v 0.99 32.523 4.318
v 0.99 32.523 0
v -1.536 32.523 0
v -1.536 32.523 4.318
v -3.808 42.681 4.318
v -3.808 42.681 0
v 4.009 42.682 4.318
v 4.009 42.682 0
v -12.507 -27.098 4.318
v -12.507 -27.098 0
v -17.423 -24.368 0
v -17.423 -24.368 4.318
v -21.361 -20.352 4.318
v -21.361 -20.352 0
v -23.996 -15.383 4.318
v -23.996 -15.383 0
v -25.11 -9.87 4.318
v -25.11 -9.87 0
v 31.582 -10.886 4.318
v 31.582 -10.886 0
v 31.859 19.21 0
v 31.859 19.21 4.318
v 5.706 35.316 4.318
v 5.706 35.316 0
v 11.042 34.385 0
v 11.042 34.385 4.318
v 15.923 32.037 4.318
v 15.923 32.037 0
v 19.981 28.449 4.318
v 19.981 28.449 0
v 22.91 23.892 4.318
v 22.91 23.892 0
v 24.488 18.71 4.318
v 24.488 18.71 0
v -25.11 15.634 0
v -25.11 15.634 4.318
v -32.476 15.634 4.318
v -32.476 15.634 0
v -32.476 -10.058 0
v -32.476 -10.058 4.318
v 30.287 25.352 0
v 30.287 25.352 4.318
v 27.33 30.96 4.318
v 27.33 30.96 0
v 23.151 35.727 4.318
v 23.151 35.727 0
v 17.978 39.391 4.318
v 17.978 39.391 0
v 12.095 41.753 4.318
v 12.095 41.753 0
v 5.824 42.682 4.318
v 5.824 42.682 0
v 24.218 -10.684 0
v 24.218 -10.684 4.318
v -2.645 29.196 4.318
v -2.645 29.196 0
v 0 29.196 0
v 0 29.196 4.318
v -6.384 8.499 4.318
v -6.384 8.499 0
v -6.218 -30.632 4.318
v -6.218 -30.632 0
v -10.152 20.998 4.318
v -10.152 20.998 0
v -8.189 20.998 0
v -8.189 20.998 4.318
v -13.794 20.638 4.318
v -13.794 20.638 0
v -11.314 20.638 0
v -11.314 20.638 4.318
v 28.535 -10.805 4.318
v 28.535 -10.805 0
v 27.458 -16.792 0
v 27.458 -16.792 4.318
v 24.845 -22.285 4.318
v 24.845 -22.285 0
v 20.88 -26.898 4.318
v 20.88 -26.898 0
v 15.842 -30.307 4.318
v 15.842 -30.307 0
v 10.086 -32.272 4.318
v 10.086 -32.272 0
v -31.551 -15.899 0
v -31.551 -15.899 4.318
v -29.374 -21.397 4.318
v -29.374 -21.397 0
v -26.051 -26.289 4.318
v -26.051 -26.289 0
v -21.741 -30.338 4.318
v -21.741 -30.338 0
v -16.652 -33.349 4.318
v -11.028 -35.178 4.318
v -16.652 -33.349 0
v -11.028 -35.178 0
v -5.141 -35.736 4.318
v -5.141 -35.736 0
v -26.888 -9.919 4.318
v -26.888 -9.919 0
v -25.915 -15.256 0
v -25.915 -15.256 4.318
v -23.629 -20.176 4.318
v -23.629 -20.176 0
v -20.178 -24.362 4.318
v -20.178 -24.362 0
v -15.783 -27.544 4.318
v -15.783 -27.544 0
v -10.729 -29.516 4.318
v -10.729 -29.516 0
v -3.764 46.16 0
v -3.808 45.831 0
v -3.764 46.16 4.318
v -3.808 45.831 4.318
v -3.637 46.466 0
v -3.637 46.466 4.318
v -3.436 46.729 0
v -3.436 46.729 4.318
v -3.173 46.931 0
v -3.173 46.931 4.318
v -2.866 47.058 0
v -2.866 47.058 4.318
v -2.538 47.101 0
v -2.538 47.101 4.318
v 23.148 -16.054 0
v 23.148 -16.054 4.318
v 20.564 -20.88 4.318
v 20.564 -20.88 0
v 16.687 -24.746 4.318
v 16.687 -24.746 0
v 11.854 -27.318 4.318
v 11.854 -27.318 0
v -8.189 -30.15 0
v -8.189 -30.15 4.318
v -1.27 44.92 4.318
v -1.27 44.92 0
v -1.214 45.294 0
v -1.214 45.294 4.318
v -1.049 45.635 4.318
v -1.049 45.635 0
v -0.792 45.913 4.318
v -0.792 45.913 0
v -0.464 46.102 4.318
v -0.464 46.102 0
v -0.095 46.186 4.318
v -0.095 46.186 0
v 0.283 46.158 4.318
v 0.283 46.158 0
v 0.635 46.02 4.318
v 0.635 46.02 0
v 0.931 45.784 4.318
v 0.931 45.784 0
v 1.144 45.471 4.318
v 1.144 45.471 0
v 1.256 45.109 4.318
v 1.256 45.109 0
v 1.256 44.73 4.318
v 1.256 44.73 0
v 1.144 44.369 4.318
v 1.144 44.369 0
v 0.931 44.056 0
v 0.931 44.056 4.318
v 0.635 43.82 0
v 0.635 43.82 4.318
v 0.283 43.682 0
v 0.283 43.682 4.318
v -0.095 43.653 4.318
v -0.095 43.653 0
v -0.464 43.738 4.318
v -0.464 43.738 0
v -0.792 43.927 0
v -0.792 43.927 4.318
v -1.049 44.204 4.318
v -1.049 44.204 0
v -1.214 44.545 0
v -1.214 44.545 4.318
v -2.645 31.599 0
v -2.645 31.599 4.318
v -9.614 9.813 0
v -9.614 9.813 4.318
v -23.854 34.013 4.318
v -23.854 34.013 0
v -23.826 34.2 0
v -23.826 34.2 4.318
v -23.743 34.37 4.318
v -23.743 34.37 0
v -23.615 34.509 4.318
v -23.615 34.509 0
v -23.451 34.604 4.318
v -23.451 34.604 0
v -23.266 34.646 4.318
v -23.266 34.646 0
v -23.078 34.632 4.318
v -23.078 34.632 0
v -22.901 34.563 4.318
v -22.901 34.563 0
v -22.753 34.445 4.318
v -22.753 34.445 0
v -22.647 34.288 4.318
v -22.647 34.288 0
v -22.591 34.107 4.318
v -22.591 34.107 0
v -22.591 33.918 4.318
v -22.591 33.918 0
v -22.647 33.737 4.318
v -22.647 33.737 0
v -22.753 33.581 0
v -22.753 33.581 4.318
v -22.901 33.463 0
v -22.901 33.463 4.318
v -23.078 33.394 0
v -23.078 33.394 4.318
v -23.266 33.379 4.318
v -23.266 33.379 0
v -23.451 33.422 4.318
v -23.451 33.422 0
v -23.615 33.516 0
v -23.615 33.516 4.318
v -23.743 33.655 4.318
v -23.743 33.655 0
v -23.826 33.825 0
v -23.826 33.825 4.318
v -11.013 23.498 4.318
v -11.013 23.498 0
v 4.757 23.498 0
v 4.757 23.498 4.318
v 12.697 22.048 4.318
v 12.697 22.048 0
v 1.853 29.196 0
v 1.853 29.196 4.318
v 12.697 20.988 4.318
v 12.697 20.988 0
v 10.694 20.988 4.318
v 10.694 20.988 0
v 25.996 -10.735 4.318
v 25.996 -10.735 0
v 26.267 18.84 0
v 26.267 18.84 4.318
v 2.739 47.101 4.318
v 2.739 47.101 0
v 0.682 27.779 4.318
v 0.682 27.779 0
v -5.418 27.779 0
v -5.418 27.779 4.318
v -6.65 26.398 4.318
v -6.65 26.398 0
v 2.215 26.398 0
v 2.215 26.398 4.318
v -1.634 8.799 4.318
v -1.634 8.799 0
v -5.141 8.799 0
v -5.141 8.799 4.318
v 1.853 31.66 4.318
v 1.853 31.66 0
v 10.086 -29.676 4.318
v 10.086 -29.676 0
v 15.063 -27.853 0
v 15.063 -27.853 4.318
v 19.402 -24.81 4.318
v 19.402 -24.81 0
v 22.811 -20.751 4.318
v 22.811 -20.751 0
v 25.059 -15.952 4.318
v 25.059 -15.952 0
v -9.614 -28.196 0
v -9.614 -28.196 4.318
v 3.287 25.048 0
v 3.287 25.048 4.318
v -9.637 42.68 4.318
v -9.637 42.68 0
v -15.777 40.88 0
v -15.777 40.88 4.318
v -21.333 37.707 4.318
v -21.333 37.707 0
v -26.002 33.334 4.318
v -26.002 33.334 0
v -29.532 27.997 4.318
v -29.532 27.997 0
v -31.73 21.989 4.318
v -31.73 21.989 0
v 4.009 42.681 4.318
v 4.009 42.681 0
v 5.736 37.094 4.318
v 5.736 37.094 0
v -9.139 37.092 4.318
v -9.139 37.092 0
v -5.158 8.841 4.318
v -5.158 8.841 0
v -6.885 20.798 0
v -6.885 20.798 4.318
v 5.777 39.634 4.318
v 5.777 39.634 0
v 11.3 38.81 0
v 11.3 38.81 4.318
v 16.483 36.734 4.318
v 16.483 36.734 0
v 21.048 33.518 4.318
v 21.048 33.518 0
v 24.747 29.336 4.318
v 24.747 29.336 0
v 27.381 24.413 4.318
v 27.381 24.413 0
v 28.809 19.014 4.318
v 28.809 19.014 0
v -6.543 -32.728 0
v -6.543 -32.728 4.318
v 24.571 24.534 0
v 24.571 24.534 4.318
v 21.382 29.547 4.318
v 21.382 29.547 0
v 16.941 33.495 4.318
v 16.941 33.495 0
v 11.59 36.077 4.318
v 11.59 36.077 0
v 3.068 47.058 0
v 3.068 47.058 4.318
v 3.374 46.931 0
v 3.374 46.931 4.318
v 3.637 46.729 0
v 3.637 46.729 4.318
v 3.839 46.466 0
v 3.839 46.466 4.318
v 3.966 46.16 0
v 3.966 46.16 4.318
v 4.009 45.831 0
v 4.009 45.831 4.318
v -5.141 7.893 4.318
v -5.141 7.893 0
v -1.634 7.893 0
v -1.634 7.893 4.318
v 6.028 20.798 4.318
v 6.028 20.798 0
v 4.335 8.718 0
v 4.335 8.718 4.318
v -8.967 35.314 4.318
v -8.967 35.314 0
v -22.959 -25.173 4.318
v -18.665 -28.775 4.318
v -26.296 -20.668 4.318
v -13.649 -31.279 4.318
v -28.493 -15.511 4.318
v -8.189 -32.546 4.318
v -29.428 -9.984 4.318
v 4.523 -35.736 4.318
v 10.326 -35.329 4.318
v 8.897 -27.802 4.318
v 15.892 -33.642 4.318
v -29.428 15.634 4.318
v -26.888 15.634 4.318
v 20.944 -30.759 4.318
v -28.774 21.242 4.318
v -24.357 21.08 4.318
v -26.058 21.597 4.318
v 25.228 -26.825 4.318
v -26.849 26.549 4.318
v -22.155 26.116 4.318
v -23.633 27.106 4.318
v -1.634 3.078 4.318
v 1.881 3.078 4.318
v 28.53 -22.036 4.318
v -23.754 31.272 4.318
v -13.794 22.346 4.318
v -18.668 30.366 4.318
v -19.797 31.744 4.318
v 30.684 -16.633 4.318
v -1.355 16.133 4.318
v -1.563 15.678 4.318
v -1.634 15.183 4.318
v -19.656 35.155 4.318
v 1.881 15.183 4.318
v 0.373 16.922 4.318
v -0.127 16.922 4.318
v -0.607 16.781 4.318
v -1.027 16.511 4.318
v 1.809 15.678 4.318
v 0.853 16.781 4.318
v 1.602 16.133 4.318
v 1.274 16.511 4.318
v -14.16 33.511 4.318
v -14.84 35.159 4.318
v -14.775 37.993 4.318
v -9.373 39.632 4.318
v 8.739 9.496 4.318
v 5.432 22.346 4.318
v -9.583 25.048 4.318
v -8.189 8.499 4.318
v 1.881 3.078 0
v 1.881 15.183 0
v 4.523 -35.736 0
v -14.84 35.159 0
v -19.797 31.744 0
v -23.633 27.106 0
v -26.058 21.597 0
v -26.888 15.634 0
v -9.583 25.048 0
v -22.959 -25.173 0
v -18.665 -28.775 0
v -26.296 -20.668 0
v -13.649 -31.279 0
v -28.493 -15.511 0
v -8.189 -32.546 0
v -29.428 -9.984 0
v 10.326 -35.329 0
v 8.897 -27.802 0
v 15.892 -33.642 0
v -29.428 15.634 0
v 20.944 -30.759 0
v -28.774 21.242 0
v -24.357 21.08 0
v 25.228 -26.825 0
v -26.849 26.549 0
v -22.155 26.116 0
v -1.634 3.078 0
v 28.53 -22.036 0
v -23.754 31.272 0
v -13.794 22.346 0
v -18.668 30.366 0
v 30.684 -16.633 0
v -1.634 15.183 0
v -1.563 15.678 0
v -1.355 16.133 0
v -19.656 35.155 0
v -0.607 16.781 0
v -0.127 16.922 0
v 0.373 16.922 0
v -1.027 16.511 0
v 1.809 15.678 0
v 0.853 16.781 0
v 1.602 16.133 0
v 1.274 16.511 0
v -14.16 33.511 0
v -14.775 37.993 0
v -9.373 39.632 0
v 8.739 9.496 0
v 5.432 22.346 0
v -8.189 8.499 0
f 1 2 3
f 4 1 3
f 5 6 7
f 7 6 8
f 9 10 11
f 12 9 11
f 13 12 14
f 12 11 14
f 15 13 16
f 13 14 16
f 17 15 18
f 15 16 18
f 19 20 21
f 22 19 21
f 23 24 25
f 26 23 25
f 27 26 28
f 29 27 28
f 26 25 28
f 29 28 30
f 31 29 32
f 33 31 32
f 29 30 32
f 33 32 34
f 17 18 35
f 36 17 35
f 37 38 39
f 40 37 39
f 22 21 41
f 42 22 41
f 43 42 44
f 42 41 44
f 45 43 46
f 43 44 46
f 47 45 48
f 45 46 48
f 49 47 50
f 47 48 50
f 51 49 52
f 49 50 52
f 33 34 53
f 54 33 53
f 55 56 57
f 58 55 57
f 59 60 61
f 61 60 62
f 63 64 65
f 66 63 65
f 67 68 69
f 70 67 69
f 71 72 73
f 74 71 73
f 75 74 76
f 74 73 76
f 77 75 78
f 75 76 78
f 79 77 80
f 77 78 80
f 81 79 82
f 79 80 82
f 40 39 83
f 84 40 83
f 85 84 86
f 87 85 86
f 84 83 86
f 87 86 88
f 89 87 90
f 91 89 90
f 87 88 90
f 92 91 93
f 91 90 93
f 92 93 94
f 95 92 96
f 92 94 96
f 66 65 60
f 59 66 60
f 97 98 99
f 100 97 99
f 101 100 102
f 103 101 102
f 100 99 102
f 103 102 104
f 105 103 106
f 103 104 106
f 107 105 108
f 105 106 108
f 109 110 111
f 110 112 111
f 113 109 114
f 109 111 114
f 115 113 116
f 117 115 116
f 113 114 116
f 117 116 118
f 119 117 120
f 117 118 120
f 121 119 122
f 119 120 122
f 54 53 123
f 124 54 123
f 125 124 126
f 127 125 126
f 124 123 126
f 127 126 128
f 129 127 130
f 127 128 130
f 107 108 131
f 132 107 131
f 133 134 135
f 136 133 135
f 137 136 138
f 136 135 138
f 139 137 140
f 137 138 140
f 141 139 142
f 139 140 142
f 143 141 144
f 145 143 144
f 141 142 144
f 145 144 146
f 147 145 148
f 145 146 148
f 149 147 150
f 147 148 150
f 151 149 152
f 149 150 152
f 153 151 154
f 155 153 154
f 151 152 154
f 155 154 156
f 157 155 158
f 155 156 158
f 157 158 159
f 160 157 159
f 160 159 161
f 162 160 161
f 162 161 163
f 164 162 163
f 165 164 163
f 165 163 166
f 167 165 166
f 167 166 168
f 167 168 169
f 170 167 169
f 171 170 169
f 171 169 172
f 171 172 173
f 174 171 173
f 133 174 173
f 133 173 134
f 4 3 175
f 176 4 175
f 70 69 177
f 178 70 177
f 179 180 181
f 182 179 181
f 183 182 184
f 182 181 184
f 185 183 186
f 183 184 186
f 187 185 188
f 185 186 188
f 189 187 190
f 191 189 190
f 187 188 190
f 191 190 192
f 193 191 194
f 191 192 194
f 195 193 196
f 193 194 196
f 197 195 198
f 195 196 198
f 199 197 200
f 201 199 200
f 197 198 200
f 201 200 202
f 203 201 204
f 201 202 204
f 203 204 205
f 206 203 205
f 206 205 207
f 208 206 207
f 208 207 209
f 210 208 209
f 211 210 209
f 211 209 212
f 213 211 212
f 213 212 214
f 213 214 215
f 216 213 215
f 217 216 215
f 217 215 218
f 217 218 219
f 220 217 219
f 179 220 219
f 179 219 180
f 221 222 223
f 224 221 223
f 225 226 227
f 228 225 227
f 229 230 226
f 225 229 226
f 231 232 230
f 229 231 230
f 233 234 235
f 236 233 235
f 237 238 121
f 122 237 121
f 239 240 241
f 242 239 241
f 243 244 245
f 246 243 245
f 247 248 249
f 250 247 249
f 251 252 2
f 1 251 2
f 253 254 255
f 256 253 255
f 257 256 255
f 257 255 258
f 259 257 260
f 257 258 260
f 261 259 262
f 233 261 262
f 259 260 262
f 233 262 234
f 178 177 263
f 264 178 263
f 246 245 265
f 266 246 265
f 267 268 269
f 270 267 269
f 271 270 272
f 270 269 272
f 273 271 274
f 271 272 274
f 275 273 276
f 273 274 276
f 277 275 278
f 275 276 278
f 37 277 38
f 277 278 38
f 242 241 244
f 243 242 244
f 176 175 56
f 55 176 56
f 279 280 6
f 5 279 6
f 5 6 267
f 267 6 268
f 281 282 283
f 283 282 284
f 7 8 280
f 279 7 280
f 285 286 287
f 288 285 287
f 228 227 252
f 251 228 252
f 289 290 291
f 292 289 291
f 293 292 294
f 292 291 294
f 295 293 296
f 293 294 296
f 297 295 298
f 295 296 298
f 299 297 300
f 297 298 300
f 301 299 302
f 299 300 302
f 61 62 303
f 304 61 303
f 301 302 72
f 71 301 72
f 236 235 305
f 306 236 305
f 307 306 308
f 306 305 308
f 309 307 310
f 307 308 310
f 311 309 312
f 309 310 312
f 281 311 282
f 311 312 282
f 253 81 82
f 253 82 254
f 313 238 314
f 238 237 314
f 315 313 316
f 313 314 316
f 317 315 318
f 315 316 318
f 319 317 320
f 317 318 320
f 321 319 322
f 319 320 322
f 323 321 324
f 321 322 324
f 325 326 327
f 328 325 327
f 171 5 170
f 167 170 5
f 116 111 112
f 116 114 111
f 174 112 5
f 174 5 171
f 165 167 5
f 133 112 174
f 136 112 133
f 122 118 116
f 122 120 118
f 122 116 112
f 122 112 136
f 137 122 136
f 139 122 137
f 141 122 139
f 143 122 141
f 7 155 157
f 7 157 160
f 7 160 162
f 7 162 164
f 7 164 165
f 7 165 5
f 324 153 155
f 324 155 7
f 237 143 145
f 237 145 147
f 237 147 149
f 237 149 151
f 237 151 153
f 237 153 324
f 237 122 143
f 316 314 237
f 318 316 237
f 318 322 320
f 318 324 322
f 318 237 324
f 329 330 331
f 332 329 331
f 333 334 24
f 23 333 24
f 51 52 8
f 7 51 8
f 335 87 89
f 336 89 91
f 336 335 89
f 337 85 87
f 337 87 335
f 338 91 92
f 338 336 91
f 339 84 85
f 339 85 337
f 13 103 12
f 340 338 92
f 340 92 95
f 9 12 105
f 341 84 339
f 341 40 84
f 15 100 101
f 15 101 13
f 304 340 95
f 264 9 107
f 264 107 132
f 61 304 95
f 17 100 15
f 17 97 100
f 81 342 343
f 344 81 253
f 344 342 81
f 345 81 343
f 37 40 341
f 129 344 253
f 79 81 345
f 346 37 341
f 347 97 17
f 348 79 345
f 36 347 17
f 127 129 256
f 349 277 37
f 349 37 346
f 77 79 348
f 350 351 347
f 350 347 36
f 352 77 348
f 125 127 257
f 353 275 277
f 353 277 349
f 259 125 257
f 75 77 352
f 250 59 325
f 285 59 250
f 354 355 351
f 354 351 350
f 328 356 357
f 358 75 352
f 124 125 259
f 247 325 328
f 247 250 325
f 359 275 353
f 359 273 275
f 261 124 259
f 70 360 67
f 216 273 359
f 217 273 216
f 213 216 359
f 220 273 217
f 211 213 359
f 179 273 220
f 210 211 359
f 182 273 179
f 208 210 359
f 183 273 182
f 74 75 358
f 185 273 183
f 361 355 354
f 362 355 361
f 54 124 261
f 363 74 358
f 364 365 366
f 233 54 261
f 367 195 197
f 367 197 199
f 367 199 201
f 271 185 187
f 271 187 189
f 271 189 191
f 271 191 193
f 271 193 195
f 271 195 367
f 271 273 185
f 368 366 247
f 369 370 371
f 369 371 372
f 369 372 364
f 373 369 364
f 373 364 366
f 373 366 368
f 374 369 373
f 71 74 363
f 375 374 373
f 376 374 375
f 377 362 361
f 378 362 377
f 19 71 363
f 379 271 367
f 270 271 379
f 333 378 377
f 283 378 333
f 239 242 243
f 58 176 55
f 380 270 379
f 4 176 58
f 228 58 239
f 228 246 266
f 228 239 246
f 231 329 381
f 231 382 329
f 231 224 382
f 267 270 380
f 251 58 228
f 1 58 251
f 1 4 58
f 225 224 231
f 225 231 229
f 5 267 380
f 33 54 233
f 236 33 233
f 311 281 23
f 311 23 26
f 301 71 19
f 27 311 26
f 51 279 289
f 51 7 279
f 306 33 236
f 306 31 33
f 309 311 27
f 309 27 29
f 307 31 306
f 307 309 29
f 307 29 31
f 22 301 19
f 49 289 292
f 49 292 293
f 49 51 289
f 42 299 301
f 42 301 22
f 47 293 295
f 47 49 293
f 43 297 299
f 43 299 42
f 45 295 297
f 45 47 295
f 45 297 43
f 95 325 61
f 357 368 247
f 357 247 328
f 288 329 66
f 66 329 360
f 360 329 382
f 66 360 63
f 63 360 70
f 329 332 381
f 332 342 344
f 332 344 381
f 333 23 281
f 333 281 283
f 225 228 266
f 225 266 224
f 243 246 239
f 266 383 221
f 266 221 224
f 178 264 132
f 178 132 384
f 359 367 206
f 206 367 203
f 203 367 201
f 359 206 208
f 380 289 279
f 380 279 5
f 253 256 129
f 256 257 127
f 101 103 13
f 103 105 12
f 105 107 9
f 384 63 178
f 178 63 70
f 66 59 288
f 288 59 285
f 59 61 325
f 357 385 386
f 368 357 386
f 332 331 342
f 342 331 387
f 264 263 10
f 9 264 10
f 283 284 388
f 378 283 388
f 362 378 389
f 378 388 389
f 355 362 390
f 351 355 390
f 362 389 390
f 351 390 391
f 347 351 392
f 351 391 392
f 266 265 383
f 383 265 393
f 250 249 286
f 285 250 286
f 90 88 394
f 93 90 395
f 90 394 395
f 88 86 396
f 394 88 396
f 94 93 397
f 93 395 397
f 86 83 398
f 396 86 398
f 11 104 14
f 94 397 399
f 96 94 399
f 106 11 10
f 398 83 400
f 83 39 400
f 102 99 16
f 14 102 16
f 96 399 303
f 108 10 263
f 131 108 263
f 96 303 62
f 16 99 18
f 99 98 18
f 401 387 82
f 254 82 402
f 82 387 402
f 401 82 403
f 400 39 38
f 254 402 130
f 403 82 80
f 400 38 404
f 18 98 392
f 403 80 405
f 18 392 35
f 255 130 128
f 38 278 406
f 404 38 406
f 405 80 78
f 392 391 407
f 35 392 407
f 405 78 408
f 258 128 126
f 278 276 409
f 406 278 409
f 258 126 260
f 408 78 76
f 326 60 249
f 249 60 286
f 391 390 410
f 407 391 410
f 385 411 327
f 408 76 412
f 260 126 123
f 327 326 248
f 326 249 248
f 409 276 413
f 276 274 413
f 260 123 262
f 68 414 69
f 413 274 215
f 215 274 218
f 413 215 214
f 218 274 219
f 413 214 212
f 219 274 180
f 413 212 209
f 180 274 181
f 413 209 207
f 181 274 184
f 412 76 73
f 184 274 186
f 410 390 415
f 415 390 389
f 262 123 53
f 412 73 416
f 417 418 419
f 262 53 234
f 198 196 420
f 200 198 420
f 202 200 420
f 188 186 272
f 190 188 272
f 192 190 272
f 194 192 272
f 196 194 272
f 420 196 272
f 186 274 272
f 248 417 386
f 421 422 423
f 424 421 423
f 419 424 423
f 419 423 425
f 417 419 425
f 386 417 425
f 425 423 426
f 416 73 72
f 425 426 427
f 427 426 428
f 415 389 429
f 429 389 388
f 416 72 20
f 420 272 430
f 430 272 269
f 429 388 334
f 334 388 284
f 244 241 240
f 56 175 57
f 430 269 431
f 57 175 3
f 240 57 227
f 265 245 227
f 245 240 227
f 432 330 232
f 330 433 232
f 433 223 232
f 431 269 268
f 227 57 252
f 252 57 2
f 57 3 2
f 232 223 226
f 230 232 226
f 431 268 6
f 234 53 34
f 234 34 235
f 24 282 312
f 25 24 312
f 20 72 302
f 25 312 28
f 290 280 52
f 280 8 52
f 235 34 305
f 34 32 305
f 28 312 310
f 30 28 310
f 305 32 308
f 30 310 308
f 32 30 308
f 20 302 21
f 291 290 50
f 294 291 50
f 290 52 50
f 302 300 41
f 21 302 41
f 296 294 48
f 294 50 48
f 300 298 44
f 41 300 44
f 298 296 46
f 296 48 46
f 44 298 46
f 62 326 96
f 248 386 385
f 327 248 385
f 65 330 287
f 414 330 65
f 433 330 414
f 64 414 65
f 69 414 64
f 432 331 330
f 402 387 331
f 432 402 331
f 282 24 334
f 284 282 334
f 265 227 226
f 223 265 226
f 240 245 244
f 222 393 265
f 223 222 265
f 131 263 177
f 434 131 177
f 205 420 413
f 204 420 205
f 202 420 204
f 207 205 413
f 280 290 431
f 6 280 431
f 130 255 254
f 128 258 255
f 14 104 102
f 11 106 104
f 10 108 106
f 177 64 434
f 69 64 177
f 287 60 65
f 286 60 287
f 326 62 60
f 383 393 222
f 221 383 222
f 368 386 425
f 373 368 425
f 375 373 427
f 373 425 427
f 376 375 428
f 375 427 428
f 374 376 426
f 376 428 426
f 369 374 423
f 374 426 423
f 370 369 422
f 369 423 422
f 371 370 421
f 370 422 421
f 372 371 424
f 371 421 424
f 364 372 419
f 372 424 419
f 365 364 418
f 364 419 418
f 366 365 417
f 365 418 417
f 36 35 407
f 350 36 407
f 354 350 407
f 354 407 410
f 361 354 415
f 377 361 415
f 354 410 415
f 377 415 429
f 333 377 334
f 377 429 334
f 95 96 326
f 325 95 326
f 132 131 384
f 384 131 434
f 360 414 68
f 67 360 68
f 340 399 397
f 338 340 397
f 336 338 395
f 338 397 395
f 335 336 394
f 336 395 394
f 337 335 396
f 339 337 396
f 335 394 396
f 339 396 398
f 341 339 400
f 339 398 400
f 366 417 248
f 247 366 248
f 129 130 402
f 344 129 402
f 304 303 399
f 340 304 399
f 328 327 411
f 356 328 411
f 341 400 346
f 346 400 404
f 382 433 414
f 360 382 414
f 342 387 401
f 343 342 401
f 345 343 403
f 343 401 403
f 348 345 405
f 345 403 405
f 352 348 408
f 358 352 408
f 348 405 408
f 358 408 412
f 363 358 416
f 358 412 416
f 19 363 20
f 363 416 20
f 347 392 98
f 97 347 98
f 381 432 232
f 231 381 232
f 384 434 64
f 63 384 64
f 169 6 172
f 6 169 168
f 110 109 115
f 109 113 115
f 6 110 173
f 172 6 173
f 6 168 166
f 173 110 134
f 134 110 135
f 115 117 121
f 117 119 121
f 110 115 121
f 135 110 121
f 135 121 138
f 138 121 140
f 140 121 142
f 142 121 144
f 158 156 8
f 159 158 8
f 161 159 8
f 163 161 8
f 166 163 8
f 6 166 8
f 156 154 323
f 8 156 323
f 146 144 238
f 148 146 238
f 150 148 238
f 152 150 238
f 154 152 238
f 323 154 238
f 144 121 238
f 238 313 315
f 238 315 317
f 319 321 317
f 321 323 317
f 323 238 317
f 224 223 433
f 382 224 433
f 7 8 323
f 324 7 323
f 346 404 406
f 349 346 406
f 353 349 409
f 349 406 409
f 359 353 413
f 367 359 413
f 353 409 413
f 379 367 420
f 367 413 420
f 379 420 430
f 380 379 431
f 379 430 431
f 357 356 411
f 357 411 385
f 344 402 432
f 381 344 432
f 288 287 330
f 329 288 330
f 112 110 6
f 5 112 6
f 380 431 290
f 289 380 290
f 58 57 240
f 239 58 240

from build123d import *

# Parameters (mm, degrees)
F1_DEPTH = 4.318
F3_D     = 1.27
F4_R     = 1.27
F6_D     = 2.54


with BuildPart() as f1:
    # F0 (on Top) → F1 (new body)
    with BuildSketch(Plane.XY):
        with BuildLine():
            Line((-3.807525, 42.680658), (-9.637443, 42.679689))
            ThreePointArc((-9.637443, 42.679689), (-26.002474, 33.333548), (-32.47584, 15.634392))
            Line((-32.47584, 15.634392), (-32.47584, -10.057848))
            ThreePointArc((-32.47584, -10.057848), (-24.007392, -28.431685), (-5.140645, -35.736367))
            Line((-5.140645, -35.736367), (-5.140645, 7.892704))
            Line((-5.140645, 7.892704), (-1.633754, 7.892704))
            Line((-1.633754, 7.892704), (-1.633754, 3.077933))
            Line((-1.633754, 3.077933), (1.880592, 3.077933))
            Line((1.880592, 3.077933), (1.880592, 15.182903))
            ThreePointArc((1.880592, 15.182903), (0.123419, 16.940076), (-1.633754, 15.182903))
            Line((-1.633754, 15.182903), (-1.633754, 8.799357))
            Line((-1.633754, 8.799357), (-5.140645, 8.799357))
            Line((-5.140645, 8.799357), (-5.158467, 8.841277))
            Line((-5.158467, 8.841277), (-6.884762, 20.797787))
            Line((-6.884762, 20.797787), (6.028086, 20.797787))
            Line((6.028086, 20.797787), (4.334597, 8.717843))
            Line((4.334597, 8.717843), (4.523314, -35.736367))
            ThreePointArc((4.523314, -35.736367), (23.196497, -28.912131), (31.582396, -10.886187))
            Line((31.582396, -10.886187), (31.858511, 19.210141))
            ThreePointArc((31.858511, 19.210141), (23.150917, 35.726511), (5.823763, 42.682261))
            Line((5.823763, 42.682261), (4.009244, 42.681959))
            Line((4.009244, 42.681959), (4.009244, 42.680658))
            Line((4.009244, 42.680658), (-3.807525, 42.680658))
        make_face()
        with BuildLine():
            ThreePointArc((-29.427839, 15.634392), (-23.753892, 31.271591), (-9.372524, 39.631732))
            Line((-9.372524, 39.631732), (5.777224, 39.634252))
            ThreePointArc((5.777224, 39.634252), (21.047973, 33.518399), (28.808584, 19.014182))
            Line((28.808584, 19.014182), (28.535011, -10.805158))
            ThreePointArc((28.535011, -10.805158), (23.015799, -24.723226), (10.085638, -32.272083))
            Line((10.085638, -32.272083), (10.085638, -29.676103))
            ThreePointArc((10.085638, -29.676103), (21.238829, -22.891883), (25.995549, -10.734872))
            Line((25.995549, -10.734872), (26.266877, 18.839709))
            ThreePointArc((26.266877, 18.839709), (19.298591, 31.675205), (5.736107, 37.094245))
            Line((5.736107, 37.094245), (-9.138729, 37.091771))
            ThreePointArc((-9.138729, 37.091771), (-21.875519, 29.557844), (-26.88784, 15.634392))
            Line((-26.88784, 15.634392), (-26.88784, -9.918525))
            ThreePointArc((-26.88784, -9.918525), (-22.036998, -22.379371), (-10.728646, -29.515511))
            Line((-10.728646, -29.515511), (-8.188646, -30.149565))
            Line((-8.188646, -30.149565), (-8.188646, 8.498941))
            Line((-8.188646, 8.498941), (-10.151862, 20.997923))
            Line((-10.151862, 20.997923), (-8.188646, 20.997923))
            Line((-8.188646, 20.997923), (-6.384029, 8.498941))
            Line((-6.384029, 8.498941), (-6.217912, -30.631771))
            Line((-6.217912, -30.631771), (-6.542962, -32.72843))
            Line((-6.542962, -32.72843), (-8.188646, -32.545969))
            ThreePointArc((-8.188646, -32.545969), (-22.959228, -25.172514), (-29.427839, -9.983868))
            Line((-29.427839, -9.983868), (-29.427839, 15.634392))
        make_face(mode=Mode.SUBTRACT)
        with BuildLine():
            ThreePointArc((-25.109839, 15.634392), (-20.557774, 28.361099), (-8.966815, 35.313798))
            Line((-8.966815, 35.313798), (5.705844, 35.316239))
            ThreePointArc((5.705844, 35.316239), (18.075971, 30.383), (24.487616, 18.710482))
            Line((24.487616, 18.710482), (24.217941, -10.683905))
            ThreePointArc((24.217941, -10.683905), (20.563717, -20.88008), (11.853645, -27.318245))
            Line((11.853645, -27.318245), (8.897178, -27.801943))
            Line((8.897178, -27.801943), (8.738842, 9.495925))
            Line((8.738842, 9.495925), (10.69387, 20.988492))
            Line((10.69387, 20.988492), (12.697401, 20.988492))
            Line((12.697401, 20.988492), (12.697401, 22.048282))
            Line((12.697401, 22.048282), (1.853033, 29.195705))
            Line((1.853033, 29.195705), (1.853033, 31.660333))
            Line((1.853033, 31.660333), (0.990414, 32.522954))
            Line((0.990414, 32.522954), (-1.535831, 32.522954))
            Line((-1.535831, 32.522954), (-2.644915, 31.598717))
            Line((-2.644915, 31.598717), (-2.644915, 29.195705))
            Line((-2.644915, 29.195705), (0, 29.195705))
            Line((0, 29.195705), (0.682335, 27.778544))
            Line((0.682335, 27.778544), (-5.417622, 27.778544))
            Line((-5.417622, 27.778544), (-6.649936, 26.398076))
            Line((-6.649936, 26.398076), (2.214543, 26.398076))
            Line((2.214543, 26.398076), (3.287057, 25.047503))
            Line((3.287057, 25.047503), (-9.583112, 25.047503))
            Line((-9.583112, 25.047503), (-11.013131, 23.498315))
            Line((-11.013131, 23.498315), (-10.354273, 23.498315))
            Line((-10.354273, 23.498315), (4.756798, 23.498315))
            Line((4.756798, 23.498315), (5.432085, 22.346355))
            Line((5.432085, 22.346355), (-13.793723, 22.346355))
            Line((-13.793723, 22.346355), (-13.793723, 20.638278))
            Line((-13.793723, 20.638278), (-11.314222, 20.638278))
            Line((-11.314222, 20.638278), (-9.613894, 9.812995))
            Line((-9.613894, 9.812995), (-9.613894, -28.1965))
            Line((-9.613894, -28.1965), (-12.506647, -27.098147))
            ThreePointArc((-12.506647, -27.098147), (-21.36148, -20.352153), (-25.109839, -9.87044))
            Line((-25.109839, -9.87044), (-25.109839, 15.634392))
        make_face(mode=Mode.SUBTRACT)
        Polygon((-3.807525, 47.101174), (-3.807525, 42.680658), (4.009244, 42.681959), (4.009244, 47.101174), align=None)
    extrude(amount=F1_DEPTH)

    # F3 (through all)
    with Locations(Plane.XY.offset(4.318)):
        with Locations((-23.218805, 34.012619)):
            Hole(F3_D / 2)

    # F4
    f4_edges = [f1.edges().sort_by_distance(p)[0] for p in [
        (-3.807525, 47.101174, 2.159),
        (4.009244, 47.101174, 2.159),
    ]]
    fillet(f4_edges, radius=F4_R)

    # F6 (through all)
    with Locations(Plane.XY.offset(4.318)):
        with Locations((0, 44.919711)):
            Hole(F6_D / 2)


solid = f1.part
